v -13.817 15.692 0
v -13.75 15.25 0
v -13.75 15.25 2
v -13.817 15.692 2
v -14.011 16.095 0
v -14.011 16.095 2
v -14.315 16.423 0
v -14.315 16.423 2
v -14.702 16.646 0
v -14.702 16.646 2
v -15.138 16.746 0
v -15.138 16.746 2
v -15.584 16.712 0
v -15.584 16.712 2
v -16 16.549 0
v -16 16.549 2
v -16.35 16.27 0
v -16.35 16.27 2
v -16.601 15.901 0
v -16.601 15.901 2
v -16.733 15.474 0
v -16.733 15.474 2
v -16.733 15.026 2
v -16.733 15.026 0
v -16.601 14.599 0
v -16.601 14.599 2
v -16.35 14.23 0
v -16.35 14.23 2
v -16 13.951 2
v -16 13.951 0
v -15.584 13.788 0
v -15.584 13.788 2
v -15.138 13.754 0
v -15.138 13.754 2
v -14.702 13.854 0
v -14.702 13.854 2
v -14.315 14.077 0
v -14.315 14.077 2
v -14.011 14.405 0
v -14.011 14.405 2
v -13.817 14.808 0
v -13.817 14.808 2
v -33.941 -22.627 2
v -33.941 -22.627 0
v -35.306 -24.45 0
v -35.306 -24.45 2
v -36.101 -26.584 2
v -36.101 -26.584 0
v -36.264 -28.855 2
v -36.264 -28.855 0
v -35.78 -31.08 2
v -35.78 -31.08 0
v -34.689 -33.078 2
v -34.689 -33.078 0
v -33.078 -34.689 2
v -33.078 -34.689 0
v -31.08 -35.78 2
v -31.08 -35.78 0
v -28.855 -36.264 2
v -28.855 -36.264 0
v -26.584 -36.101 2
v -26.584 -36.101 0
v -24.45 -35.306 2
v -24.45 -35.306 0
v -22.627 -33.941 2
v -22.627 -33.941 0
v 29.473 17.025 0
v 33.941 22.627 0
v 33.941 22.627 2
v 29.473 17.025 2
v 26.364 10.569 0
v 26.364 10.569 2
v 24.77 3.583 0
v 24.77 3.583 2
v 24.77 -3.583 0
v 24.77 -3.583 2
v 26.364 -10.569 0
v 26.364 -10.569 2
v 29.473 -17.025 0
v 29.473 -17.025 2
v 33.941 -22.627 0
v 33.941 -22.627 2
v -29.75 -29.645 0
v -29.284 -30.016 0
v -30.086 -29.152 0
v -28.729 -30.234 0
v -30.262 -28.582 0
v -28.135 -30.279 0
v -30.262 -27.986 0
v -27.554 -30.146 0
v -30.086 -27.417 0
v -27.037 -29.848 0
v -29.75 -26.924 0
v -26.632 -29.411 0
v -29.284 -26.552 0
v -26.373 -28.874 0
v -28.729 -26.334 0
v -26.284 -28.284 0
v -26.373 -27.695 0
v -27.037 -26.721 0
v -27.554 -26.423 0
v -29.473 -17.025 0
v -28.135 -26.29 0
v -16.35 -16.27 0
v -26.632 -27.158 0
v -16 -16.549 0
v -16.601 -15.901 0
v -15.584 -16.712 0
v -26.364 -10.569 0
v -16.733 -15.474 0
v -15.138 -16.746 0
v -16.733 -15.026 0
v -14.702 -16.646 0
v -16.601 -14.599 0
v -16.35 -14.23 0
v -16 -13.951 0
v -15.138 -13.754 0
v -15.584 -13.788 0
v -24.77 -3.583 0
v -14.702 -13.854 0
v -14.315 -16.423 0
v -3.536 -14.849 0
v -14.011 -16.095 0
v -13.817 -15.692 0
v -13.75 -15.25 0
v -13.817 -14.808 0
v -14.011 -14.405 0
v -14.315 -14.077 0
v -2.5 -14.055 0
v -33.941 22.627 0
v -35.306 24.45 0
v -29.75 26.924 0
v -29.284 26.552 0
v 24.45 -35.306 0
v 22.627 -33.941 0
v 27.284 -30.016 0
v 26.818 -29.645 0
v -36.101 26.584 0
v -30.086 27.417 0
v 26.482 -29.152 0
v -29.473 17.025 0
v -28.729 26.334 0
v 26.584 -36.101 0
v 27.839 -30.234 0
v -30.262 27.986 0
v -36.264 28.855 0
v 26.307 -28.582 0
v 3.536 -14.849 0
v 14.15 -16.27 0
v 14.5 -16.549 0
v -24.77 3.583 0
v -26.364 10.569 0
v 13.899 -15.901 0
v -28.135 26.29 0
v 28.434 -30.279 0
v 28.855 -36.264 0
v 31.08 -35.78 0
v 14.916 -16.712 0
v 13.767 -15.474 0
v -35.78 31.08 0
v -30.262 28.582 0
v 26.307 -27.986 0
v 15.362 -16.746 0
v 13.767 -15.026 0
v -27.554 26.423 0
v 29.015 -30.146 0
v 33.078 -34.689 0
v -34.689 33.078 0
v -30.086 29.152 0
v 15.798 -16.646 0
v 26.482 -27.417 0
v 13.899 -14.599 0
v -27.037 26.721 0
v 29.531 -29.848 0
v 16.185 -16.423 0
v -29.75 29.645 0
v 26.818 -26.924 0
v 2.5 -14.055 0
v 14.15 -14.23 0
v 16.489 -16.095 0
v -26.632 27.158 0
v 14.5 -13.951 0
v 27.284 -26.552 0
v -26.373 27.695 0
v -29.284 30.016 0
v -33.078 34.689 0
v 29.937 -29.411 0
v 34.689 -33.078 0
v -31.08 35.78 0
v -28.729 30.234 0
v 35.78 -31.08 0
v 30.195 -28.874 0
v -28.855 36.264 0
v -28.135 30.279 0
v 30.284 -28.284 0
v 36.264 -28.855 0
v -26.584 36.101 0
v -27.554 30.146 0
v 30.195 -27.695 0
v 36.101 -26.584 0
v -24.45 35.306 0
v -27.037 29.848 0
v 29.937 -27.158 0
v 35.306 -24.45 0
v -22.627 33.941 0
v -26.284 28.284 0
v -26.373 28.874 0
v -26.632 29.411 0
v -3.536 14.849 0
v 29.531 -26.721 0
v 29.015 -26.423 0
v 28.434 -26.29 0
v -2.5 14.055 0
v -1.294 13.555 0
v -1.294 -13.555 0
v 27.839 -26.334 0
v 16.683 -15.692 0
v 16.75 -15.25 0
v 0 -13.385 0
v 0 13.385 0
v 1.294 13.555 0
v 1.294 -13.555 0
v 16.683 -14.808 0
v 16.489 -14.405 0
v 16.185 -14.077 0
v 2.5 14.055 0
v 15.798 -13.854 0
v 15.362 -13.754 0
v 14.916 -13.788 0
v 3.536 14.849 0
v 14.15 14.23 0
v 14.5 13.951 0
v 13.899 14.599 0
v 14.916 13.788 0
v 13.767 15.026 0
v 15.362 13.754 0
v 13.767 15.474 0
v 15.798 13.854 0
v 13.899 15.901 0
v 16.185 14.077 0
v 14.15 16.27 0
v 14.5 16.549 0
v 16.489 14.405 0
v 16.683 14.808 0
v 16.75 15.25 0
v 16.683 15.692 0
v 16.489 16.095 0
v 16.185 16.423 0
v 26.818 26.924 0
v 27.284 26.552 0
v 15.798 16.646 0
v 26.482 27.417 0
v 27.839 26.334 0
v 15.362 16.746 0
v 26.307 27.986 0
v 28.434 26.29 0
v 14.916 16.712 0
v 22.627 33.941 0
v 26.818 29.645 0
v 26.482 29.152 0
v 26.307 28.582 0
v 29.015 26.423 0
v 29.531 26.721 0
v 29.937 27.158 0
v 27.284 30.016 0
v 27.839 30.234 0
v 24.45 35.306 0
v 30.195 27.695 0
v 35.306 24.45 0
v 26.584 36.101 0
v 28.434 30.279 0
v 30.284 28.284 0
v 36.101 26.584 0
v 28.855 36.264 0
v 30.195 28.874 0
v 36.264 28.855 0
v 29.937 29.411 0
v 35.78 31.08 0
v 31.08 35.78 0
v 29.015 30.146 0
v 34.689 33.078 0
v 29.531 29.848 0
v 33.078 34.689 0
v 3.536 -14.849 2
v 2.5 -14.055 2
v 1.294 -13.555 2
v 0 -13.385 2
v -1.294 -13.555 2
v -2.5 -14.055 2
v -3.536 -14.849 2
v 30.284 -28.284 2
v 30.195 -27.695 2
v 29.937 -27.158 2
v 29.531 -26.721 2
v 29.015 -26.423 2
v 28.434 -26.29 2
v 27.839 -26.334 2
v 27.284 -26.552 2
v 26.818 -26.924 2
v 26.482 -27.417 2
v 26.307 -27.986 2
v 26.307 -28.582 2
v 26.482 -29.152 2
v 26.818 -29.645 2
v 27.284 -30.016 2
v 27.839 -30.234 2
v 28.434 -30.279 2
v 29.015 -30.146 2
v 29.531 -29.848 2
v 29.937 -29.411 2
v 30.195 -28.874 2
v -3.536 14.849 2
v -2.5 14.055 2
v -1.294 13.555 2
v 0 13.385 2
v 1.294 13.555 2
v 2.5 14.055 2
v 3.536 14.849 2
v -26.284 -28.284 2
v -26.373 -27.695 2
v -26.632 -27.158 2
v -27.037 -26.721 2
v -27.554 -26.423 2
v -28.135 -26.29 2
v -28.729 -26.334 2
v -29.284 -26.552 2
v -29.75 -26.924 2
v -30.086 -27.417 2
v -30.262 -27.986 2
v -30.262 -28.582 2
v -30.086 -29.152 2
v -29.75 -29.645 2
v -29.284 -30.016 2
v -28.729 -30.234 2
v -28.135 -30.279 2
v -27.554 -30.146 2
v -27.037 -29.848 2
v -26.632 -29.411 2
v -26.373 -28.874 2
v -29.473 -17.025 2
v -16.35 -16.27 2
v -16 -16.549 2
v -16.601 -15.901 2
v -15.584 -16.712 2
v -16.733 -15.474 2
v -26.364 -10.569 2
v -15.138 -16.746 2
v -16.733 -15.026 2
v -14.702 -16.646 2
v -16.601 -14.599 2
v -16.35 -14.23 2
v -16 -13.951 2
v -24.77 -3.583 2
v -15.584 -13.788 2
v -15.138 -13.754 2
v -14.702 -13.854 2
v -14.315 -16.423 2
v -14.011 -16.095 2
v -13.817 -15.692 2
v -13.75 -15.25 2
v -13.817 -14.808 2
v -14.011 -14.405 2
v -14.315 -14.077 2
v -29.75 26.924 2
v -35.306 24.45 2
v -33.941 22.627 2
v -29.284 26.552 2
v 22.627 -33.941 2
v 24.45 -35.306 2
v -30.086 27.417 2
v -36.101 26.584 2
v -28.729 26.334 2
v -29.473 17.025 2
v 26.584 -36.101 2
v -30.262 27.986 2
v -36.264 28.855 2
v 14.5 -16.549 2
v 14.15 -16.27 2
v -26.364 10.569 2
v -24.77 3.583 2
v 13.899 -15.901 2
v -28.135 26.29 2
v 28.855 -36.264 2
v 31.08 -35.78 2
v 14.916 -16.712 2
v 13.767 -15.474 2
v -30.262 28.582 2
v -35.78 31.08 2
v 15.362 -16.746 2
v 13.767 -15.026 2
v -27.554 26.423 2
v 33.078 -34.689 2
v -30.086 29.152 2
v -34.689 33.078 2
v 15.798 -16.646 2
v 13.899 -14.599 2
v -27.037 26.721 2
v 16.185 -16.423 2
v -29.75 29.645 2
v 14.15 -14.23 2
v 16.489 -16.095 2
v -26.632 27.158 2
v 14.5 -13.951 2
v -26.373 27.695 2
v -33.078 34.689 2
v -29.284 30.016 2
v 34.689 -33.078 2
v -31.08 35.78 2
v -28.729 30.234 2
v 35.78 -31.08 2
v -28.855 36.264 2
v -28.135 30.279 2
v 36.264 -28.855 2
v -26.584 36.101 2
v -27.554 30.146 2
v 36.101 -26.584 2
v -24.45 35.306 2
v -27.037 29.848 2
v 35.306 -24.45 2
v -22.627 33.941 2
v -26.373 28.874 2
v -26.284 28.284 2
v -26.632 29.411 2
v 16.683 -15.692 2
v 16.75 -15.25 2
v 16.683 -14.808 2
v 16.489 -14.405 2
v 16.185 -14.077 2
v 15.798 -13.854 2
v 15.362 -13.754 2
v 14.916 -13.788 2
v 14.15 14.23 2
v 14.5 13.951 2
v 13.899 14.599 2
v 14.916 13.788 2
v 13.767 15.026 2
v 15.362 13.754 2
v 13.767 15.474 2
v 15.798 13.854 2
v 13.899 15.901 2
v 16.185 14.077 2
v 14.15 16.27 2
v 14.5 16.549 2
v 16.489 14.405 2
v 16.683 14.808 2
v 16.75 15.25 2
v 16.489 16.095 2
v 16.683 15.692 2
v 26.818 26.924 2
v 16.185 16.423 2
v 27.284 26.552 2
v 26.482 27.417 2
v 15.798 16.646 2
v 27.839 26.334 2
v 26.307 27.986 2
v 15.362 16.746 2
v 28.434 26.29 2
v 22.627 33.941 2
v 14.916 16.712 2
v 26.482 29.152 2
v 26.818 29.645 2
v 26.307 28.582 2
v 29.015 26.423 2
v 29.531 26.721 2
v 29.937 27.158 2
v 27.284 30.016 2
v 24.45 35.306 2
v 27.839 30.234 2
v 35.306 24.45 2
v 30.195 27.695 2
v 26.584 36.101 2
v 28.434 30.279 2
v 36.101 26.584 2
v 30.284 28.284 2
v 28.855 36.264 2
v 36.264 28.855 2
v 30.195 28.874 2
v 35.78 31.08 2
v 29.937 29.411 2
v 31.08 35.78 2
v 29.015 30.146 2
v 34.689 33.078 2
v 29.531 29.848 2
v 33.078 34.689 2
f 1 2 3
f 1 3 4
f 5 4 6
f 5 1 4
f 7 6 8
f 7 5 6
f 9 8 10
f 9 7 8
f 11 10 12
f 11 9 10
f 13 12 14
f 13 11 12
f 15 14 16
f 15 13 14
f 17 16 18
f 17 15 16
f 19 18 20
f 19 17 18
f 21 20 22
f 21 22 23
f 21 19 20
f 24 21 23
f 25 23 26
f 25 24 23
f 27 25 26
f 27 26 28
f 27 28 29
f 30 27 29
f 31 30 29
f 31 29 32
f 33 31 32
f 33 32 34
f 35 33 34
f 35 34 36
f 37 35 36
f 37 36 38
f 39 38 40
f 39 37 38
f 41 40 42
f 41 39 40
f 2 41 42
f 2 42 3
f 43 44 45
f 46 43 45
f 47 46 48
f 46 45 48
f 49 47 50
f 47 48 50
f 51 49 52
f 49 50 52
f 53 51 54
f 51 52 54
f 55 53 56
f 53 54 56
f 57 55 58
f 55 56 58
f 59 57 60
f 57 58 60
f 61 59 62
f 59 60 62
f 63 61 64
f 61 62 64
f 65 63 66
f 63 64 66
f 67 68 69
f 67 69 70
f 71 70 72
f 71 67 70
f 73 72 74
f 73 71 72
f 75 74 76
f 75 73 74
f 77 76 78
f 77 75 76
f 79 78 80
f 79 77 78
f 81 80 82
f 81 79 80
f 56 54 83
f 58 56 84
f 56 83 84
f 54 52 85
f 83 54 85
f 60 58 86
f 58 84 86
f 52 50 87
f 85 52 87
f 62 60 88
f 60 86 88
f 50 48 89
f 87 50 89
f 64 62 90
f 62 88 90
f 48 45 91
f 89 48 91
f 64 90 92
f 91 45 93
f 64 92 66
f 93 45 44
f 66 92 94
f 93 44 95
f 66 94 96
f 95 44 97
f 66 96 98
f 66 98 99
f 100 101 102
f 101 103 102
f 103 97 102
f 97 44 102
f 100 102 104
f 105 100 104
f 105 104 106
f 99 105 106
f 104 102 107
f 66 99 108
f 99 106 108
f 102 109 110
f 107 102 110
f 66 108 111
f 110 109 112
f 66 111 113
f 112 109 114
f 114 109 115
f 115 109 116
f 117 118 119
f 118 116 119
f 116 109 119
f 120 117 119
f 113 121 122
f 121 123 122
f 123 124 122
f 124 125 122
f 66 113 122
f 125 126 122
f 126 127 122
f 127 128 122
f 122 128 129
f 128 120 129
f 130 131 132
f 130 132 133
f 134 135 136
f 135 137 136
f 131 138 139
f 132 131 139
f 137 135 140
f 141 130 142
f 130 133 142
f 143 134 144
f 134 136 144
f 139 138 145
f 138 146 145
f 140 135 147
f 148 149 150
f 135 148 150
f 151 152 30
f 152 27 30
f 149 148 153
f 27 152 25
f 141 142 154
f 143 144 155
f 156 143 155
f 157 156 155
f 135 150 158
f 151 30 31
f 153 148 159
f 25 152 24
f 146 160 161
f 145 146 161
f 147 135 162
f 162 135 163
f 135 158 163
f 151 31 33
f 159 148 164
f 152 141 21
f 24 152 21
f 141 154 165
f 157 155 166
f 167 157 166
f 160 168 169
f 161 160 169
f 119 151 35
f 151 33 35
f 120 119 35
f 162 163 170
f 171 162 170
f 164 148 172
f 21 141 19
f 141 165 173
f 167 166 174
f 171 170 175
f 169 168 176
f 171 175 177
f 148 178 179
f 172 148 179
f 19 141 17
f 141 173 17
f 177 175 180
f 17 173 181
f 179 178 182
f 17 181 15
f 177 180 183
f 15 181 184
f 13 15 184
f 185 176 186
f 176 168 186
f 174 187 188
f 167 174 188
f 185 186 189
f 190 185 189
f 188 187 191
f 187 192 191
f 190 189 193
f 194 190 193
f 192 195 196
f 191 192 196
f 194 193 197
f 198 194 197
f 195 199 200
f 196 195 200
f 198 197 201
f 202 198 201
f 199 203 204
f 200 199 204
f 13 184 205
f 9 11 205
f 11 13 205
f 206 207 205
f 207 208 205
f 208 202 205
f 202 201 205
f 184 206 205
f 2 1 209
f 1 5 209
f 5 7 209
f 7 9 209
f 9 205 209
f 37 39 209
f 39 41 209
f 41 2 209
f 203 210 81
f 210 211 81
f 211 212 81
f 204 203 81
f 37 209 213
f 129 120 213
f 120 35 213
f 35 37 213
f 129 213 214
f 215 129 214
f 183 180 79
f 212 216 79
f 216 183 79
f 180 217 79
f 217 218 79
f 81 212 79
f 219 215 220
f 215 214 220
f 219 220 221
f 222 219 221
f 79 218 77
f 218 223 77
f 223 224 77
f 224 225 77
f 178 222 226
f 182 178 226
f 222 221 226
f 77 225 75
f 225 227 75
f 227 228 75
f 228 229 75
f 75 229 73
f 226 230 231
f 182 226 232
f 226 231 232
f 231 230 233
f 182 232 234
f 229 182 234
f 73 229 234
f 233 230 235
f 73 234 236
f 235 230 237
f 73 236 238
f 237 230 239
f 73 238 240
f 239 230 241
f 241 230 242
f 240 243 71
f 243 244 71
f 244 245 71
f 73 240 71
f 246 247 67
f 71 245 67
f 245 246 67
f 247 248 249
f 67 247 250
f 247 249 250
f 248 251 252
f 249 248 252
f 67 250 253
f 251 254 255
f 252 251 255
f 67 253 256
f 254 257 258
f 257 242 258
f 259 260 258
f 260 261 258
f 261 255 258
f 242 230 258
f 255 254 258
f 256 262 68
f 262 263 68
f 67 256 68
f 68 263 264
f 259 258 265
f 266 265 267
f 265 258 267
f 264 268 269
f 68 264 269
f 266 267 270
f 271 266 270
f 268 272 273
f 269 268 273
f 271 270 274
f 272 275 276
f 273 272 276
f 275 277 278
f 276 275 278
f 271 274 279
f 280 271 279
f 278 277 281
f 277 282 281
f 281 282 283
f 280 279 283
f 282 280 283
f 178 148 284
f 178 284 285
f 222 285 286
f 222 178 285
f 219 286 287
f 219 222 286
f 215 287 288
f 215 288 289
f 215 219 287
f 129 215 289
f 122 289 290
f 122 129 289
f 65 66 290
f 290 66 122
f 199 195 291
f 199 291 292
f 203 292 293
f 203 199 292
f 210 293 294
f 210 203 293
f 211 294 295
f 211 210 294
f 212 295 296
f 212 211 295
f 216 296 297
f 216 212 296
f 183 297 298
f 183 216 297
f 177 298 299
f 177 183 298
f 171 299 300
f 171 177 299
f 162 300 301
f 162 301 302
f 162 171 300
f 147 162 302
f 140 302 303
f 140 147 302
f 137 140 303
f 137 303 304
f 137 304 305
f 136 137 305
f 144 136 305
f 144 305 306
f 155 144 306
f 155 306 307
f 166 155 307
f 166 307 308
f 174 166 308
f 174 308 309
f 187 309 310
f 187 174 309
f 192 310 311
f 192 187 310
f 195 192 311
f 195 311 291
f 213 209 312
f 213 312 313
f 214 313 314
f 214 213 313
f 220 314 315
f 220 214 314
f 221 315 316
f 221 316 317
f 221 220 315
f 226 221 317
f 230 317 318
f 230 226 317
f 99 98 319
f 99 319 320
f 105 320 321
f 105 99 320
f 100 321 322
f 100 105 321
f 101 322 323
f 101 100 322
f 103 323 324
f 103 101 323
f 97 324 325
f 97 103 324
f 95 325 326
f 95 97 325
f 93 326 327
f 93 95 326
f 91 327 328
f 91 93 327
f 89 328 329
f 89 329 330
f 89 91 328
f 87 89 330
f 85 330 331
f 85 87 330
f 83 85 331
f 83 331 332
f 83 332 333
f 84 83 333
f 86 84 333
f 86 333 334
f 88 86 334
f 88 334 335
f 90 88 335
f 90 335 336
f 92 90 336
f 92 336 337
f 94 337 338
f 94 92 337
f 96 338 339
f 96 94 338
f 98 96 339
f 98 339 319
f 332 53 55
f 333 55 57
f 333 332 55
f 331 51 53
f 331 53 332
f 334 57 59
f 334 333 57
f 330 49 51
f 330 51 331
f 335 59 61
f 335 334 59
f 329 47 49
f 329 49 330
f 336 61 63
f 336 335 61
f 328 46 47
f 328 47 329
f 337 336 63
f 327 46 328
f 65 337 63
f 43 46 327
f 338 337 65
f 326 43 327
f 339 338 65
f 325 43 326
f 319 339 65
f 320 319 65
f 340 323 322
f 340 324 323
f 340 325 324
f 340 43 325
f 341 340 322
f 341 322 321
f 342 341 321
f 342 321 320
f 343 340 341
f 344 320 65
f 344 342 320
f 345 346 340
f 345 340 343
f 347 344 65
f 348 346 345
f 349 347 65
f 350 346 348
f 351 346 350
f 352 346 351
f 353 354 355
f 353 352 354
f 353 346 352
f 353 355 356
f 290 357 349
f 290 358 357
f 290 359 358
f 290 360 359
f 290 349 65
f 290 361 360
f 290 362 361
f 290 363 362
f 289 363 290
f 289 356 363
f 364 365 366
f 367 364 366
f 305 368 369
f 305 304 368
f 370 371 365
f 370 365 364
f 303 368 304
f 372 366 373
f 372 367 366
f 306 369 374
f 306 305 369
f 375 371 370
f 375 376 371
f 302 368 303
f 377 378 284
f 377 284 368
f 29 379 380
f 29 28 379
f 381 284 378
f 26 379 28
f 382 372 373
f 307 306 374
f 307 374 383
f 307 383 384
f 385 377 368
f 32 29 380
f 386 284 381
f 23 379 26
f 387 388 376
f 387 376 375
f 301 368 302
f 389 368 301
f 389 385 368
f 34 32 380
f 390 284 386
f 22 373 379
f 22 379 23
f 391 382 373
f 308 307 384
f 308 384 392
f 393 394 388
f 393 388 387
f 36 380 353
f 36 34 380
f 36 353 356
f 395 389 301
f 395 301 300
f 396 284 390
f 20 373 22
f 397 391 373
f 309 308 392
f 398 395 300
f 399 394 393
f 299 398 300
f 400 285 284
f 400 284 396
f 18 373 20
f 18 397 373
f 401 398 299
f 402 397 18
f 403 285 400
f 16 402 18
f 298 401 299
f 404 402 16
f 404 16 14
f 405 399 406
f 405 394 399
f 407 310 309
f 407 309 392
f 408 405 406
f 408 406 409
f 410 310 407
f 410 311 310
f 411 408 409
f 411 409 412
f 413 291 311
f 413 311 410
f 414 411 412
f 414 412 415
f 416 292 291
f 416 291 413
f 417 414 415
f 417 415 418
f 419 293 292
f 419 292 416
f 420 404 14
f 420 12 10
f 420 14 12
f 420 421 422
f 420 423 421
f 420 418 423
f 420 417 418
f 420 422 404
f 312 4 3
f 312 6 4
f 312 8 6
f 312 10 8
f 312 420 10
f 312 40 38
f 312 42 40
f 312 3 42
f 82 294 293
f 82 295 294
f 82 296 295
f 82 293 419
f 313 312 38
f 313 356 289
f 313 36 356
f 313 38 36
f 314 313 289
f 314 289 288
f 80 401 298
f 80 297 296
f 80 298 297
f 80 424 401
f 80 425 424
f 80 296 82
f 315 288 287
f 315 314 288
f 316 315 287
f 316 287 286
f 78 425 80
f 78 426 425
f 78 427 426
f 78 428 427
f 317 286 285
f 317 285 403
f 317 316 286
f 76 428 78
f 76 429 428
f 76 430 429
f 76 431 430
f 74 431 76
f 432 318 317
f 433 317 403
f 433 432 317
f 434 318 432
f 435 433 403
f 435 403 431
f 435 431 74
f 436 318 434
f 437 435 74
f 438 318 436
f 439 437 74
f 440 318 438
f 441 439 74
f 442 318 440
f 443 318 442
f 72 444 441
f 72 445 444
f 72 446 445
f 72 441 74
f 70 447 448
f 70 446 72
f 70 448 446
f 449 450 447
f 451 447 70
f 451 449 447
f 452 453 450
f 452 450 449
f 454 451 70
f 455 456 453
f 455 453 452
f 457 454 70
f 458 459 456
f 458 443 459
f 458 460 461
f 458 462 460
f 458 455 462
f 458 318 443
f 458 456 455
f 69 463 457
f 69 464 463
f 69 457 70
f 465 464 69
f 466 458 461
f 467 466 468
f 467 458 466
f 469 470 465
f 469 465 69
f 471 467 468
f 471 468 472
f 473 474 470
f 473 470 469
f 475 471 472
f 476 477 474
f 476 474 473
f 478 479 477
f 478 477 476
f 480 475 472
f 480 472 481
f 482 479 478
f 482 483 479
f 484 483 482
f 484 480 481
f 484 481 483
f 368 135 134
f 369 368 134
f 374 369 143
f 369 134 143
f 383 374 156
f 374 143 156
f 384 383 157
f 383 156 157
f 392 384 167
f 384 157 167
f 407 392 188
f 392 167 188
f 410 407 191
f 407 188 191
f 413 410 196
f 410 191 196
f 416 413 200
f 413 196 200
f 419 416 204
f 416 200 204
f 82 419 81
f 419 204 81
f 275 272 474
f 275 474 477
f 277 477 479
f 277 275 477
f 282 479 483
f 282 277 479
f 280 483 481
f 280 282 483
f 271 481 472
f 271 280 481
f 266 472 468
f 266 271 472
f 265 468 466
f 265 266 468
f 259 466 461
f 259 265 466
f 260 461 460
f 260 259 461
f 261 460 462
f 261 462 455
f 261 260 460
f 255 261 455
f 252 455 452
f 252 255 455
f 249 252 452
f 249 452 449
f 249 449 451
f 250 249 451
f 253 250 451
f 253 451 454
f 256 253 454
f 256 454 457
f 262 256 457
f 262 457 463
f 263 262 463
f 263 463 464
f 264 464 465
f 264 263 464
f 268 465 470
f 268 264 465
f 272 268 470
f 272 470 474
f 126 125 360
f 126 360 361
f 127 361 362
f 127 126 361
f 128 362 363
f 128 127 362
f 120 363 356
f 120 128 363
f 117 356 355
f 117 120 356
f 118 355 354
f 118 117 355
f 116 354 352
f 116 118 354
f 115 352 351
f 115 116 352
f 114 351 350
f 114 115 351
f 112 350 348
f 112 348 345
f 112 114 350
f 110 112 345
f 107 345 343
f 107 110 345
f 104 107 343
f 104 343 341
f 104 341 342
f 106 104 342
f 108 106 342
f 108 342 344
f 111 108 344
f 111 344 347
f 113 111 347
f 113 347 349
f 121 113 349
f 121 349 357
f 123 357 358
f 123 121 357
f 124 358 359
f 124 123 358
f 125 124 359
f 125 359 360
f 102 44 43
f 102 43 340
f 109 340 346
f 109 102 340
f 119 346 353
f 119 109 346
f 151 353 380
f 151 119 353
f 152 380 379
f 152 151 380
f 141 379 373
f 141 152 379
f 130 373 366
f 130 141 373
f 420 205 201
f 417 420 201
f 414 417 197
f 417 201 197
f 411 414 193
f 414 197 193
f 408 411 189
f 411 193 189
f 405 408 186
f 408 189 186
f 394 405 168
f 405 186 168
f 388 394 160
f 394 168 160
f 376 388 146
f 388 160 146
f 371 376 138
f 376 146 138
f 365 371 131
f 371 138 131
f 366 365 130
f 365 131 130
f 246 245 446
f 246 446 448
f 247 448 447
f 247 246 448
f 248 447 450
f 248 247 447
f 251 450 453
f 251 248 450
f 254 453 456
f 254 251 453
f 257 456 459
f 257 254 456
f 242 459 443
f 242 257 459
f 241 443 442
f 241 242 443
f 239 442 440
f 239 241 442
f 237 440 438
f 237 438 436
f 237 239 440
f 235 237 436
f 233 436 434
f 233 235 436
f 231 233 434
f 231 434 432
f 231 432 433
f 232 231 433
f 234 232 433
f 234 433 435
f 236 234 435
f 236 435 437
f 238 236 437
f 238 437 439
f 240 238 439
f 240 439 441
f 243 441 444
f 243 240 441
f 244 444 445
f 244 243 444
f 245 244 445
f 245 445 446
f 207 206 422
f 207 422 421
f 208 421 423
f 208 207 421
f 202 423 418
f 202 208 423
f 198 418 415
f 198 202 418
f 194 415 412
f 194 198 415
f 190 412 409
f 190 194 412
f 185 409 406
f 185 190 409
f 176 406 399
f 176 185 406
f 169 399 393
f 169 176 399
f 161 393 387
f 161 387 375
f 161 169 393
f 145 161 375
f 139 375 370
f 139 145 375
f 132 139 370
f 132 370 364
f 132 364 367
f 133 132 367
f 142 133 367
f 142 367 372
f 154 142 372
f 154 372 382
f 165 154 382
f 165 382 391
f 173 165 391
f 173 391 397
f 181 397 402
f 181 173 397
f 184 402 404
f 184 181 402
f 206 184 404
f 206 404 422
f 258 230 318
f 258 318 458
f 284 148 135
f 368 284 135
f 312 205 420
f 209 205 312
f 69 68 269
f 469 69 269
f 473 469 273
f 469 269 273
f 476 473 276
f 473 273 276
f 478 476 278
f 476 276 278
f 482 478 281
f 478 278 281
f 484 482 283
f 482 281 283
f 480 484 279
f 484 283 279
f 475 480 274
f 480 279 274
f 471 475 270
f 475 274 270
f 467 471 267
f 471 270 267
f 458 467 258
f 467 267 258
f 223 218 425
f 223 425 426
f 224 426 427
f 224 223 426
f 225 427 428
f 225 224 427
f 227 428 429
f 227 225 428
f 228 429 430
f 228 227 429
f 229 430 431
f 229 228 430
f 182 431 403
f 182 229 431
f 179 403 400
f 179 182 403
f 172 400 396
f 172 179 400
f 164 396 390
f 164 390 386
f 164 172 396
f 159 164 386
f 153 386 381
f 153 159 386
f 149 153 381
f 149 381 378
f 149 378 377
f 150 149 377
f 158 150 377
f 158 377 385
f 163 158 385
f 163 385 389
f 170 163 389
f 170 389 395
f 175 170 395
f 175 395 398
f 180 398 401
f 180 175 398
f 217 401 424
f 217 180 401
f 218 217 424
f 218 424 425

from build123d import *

# Parameters (mm, degrees)
SKETCH_R      = 2
SKETCH_R_2    = 1.5
EXTRUDE_DEPTH = 2


with BuildPart() as part:
    # Sketch → Extrude (new body)
    with BuildSketch(Plane.XY):
        with BuildLine():
            ThreePointArc((-22.627417, 33.941125), (-33.941125, 33.941125), (-33.941125, 22.627417))
            ThreePointArc((-33.941125, -22.627417), (-24.568542, 0), (-33.941125, 22.627417))
            ThreePointArc((-33.941125, -22.627417), (-33.941125, -33.941125), (-22.627417, -33.941125))
            Line((-22.627417, -33.941125), (-3.535534, -14.849242))
            ThreePointArc((3.535534, -14.849242), (0, -13.384776), (-3.535534, -14.849242))
            Line((3.535534, -14.849242), (22.627417, -33.941125))
            ThreePointArc((22.627417, -33.941125), (33.941125, -33.941125), (33.941125, -22.627417))
            ThreePointArc((33.941125, 22.627417), (24.568542, 0), (33.941125, -22.627417))
            ThreePointArc((33.941125, 22.627417), (33.941125, 33.941125), (22.627417, 33.941125))
            Line((3.535534, 14.849242), (22.627417, 33.941125))
            ThreePointArc((-3.535534, 14.849242), (0, 13.384776), (3.535534, 14.849242))
            Line((-22.627417, 33.941125), (-3.535534, 14.849242))
        make_face()
        with Locations((28.284271, 28.284271)):
            Circle(SKETCH_R, mode=Mode.SUBTRACT)
        with Locations((28.284271, -28.284271)):
            Circle(SKETCH_R, mode=Mode.SUBTRACT)
        with Locations((-28.284271, -28.284271)):
            Circle(SKETCH_R, mode=Mode.SUBTRACT)
        with Locations((-28.284271, 28.284271)):
            Circle(SKETCH_R, mode=Mode.SUBTRACT)
        with Locations((15.25, 15.25)):
            Circle(SKETCH_R_2, mode=Mode.SUBTRACT)
        with Locations((-15.25, 15.25)):
            Circle(SKETCH_R_2, mode=Mode.SUBTRACT)
        with Locations((-15.25, -15.25)):
            Circle(SKETCH_R_2, mode=Mode.SUBTRACT)
        with Locations((15.25, -15.25)):
            Circle(SKETCH_R_2, mode=Mode.SUBTRACT)
    extrude(amount=EXTRUDE_DEPTH)


solid = part.part
